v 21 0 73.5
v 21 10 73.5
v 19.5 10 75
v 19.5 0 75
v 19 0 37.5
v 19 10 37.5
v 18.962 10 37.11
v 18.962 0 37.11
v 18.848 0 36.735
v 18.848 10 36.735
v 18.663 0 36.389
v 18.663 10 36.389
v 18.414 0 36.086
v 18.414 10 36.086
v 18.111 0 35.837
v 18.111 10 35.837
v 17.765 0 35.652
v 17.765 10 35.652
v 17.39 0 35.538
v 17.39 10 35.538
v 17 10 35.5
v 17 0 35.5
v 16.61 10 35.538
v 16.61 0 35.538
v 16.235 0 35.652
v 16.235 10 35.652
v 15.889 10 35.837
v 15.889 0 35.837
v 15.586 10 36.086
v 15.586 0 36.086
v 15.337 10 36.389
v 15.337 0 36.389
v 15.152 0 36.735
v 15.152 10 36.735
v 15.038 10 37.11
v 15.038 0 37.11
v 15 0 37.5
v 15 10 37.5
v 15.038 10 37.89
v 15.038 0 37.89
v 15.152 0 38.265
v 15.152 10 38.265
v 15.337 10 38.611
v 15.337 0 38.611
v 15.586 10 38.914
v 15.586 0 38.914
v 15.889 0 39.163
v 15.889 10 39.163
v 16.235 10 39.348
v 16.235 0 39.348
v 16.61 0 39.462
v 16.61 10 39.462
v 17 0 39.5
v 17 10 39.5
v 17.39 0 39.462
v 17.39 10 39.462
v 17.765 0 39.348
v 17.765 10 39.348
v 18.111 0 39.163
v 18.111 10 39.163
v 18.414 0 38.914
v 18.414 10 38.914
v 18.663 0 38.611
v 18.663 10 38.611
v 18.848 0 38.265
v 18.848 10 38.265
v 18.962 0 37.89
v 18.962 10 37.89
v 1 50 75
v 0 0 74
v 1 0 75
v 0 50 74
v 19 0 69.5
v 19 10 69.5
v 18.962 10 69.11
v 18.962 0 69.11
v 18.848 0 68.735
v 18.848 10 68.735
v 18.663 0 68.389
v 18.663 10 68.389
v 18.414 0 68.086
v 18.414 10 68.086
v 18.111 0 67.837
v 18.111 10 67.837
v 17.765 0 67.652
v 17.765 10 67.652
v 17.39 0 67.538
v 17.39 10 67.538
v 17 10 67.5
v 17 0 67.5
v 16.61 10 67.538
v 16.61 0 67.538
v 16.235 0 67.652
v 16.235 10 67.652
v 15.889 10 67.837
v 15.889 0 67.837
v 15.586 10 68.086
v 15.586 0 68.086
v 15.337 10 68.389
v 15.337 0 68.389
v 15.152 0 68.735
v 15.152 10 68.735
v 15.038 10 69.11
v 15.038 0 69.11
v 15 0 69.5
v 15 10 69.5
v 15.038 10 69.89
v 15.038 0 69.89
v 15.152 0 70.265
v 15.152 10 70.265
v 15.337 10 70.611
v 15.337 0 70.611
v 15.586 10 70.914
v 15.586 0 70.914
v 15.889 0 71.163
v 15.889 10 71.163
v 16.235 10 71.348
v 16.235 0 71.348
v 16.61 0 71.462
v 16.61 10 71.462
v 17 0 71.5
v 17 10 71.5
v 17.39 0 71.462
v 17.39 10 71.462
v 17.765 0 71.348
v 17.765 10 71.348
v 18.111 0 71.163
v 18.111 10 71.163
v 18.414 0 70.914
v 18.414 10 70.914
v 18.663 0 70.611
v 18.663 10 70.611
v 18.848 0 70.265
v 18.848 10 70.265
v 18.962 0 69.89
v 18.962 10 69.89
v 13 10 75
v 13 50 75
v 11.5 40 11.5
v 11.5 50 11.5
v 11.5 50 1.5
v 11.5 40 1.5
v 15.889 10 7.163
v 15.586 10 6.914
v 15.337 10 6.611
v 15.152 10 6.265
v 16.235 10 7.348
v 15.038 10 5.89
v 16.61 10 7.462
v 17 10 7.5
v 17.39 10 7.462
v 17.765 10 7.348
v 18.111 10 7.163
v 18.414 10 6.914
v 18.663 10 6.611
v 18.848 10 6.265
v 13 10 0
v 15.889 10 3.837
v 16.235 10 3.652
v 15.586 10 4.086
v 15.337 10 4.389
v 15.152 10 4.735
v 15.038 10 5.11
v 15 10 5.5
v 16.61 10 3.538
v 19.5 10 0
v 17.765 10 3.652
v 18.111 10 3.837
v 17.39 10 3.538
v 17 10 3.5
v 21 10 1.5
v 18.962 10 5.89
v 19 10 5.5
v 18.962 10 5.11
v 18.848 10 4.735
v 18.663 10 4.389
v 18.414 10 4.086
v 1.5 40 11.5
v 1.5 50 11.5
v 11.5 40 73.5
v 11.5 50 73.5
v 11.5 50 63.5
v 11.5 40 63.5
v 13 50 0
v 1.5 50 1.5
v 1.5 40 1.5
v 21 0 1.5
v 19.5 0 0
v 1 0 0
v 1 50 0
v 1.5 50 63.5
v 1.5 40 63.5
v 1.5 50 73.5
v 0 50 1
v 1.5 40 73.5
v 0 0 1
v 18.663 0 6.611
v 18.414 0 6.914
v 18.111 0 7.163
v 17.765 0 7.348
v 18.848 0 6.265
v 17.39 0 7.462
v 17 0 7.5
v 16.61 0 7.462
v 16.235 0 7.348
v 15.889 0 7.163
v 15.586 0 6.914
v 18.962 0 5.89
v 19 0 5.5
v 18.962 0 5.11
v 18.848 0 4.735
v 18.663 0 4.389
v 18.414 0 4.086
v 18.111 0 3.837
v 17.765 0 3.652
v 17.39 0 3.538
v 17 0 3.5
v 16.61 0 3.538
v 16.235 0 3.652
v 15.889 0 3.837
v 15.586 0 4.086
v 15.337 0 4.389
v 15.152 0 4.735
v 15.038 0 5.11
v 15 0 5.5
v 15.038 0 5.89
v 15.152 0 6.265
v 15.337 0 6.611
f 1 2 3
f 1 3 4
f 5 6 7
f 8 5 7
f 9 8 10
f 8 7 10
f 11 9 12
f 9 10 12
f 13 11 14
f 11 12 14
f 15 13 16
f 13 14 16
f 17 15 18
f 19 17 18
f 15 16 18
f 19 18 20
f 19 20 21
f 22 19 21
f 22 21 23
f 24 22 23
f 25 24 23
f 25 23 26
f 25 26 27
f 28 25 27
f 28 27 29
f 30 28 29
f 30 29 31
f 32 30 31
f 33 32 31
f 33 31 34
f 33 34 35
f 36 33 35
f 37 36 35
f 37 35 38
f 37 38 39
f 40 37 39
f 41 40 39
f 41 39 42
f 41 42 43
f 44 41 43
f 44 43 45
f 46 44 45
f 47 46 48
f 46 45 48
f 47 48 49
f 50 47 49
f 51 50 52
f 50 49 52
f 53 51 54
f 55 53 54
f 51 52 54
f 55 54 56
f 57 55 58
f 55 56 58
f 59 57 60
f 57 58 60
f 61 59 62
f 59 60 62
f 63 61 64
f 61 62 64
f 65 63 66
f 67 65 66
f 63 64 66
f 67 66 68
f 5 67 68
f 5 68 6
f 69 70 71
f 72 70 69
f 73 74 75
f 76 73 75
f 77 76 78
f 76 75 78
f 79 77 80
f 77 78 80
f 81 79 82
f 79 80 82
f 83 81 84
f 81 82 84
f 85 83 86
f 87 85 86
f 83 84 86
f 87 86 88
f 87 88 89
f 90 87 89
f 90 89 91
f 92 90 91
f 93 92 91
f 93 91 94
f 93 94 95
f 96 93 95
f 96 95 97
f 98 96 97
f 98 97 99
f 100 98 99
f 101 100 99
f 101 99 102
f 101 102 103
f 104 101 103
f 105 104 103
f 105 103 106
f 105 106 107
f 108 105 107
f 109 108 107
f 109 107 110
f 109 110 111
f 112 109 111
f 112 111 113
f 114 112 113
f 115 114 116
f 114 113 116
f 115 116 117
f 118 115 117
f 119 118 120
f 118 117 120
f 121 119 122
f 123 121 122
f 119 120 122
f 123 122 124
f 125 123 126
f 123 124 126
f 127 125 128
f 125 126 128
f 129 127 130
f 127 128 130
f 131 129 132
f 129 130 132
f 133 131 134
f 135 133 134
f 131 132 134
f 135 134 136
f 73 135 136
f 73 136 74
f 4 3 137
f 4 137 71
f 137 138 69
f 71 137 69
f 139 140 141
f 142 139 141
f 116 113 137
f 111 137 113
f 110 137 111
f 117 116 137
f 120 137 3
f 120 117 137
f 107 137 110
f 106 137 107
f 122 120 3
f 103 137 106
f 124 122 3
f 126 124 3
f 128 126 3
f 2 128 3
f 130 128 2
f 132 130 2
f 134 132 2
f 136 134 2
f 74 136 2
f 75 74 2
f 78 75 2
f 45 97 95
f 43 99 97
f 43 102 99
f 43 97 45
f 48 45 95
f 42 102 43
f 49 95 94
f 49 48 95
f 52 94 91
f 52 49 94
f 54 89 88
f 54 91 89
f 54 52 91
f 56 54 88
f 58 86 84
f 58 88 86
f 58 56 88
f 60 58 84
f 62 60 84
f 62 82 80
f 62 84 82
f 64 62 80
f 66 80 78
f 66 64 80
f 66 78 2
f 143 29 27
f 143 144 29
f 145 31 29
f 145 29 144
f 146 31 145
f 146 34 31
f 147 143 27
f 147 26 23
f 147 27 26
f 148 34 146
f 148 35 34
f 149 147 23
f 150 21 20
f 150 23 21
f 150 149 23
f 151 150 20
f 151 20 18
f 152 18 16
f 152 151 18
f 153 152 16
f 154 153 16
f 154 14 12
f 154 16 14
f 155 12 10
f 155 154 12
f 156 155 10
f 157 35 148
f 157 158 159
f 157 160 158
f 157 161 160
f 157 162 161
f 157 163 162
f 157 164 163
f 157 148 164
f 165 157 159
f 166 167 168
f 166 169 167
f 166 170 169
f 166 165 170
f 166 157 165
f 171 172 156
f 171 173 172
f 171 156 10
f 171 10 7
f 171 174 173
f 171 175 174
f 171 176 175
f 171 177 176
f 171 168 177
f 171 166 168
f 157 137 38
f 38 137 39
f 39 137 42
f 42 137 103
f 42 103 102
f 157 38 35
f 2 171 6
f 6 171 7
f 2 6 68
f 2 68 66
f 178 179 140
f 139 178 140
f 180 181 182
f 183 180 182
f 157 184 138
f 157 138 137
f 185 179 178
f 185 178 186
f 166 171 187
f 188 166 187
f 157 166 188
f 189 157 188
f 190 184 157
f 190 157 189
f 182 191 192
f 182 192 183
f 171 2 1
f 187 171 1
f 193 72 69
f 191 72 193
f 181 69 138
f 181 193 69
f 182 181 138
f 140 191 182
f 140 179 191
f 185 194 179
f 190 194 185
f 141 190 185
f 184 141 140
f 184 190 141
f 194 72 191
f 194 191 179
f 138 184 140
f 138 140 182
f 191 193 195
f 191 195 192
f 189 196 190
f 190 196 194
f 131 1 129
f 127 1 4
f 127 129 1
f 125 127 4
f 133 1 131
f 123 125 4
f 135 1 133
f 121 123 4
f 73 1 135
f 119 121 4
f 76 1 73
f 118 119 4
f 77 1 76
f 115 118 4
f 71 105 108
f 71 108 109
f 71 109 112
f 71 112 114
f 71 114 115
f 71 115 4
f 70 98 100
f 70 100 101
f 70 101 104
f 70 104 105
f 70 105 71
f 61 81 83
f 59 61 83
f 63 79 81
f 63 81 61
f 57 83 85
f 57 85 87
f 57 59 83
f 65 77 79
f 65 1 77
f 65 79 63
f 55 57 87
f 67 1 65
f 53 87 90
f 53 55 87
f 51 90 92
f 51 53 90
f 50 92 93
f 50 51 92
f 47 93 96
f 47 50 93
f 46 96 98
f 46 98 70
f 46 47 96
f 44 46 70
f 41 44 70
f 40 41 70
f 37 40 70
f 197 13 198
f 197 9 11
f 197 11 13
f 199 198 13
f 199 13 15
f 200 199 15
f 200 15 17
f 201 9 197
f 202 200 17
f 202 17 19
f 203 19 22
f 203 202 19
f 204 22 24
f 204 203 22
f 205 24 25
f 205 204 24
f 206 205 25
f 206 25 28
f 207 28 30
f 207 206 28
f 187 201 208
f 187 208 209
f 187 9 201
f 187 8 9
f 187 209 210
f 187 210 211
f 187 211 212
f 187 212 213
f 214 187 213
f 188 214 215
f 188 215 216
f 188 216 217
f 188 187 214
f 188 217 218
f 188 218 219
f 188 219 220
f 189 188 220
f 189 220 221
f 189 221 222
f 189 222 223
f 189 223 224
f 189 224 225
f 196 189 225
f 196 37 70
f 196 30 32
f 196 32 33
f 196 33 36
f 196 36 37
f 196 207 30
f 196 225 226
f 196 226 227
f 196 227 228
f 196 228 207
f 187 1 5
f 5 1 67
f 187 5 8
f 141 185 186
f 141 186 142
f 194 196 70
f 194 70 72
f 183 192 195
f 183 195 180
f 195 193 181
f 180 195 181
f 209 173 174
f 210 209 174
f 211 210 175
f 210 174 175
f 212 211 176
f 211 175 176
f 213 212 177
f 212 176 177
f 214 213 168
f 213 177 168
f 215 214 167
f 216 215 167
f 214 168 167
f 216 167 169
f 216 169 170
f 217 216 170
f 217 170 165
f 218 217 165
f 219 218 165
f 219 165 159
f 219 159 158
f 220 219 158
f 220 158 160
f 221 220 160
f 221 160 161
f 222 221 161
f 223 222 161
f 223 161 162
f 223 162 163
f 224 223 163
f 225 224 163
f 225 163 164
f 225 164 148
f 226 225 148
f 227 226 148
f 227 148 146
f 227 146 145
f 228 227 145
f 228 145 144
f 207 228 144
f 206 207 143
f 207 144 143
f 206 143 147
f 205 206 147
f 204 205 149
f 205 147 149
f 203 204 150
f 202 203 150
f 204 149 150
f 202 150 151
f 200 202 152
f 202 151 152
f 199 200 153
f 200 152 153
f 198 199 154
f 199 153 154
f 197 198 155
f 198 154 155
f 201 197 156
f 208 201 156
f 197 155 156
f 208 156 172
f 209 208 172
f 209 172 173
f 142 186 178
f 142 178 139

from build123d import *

# Parameters (mm, degrees)
BOSS_EXTRUDE1_DEPTH = 75
SKETCH3_W           = 10
SKETCH3_H           = 10
CUT_EXTRUDE1_DEPTH  = 10
SKETCH4_R           = 2
CUT_EXTRUDE2_DEPTH  = 11
CHAMFER1_SIZE       = 1.5
CHAMFER2_SIZE       = 1


with BuildPart() as part:
    # Sketch2 → Boss-Extrude1 (new body)
    with BuildSketch(Plane.XY):
        Polygon((13, 50), (13, 10), (21, 10), (21, 0), (0, 0), (0, 50), align=None)
    extrude(amount=BOSS_EXTRUDE1_DEPTH)

    # Sketch3 → Cut-Extrude1 (cut)
    with BuildSketch(Plane(origin=(0, 50, 0), x_dir=(1, 0, 0), z_dir=(0, 1, 0))):
        with Locations((6.5, -6.5)):
            Rectangle(SKETCH3_W, SKETCH3_H)
        with Locations((6.5, -68.5)):
            Rectangle(SKETCH3_W, SKETCH3_H)
    extrude(amount=-CUT_EXTRUDE1_DEPTH, mode=Mode.SUBTRACT)

    # Sketch4 → Cut-Extrude2 (cut, through all)
    with BuildSketch(Plane(origin=(0, 10, 0), x_dir=(1, 0, 0), z_dir=(0, 1, 0))):
        with Locations((17, -5.5)):
            Circle(SKETCH4_R)
        with Locations((17, -37.5)):
            Circle(SKETCH4_R)
        with Locations((17, -69.5)):
            Circle(SKETCH4_R)
    extrude(amount=-CUT_EXTRUDE2_DEPTH, mode=Mode.SUBTRACT)

    # Chamfer1
    chamfer1_edges = [part.edges().sort_by_distance(p)[0] for p in [
        (21, 5, 75),
        (21, 5, 0),
    ]]
    chamfer(chamfer1_edges, length=CHAMFER1_SIZE)

    # Chamfer2
    chamfer2_edges = [part.edges().sort_by_distance(p)[0] for p in [
        (0, 25, 75),
        (0, 25, 0),
    ]]
    chamfer(chamfer2_edges, length=CHAMFER2_SIZE)


solid = part.part
